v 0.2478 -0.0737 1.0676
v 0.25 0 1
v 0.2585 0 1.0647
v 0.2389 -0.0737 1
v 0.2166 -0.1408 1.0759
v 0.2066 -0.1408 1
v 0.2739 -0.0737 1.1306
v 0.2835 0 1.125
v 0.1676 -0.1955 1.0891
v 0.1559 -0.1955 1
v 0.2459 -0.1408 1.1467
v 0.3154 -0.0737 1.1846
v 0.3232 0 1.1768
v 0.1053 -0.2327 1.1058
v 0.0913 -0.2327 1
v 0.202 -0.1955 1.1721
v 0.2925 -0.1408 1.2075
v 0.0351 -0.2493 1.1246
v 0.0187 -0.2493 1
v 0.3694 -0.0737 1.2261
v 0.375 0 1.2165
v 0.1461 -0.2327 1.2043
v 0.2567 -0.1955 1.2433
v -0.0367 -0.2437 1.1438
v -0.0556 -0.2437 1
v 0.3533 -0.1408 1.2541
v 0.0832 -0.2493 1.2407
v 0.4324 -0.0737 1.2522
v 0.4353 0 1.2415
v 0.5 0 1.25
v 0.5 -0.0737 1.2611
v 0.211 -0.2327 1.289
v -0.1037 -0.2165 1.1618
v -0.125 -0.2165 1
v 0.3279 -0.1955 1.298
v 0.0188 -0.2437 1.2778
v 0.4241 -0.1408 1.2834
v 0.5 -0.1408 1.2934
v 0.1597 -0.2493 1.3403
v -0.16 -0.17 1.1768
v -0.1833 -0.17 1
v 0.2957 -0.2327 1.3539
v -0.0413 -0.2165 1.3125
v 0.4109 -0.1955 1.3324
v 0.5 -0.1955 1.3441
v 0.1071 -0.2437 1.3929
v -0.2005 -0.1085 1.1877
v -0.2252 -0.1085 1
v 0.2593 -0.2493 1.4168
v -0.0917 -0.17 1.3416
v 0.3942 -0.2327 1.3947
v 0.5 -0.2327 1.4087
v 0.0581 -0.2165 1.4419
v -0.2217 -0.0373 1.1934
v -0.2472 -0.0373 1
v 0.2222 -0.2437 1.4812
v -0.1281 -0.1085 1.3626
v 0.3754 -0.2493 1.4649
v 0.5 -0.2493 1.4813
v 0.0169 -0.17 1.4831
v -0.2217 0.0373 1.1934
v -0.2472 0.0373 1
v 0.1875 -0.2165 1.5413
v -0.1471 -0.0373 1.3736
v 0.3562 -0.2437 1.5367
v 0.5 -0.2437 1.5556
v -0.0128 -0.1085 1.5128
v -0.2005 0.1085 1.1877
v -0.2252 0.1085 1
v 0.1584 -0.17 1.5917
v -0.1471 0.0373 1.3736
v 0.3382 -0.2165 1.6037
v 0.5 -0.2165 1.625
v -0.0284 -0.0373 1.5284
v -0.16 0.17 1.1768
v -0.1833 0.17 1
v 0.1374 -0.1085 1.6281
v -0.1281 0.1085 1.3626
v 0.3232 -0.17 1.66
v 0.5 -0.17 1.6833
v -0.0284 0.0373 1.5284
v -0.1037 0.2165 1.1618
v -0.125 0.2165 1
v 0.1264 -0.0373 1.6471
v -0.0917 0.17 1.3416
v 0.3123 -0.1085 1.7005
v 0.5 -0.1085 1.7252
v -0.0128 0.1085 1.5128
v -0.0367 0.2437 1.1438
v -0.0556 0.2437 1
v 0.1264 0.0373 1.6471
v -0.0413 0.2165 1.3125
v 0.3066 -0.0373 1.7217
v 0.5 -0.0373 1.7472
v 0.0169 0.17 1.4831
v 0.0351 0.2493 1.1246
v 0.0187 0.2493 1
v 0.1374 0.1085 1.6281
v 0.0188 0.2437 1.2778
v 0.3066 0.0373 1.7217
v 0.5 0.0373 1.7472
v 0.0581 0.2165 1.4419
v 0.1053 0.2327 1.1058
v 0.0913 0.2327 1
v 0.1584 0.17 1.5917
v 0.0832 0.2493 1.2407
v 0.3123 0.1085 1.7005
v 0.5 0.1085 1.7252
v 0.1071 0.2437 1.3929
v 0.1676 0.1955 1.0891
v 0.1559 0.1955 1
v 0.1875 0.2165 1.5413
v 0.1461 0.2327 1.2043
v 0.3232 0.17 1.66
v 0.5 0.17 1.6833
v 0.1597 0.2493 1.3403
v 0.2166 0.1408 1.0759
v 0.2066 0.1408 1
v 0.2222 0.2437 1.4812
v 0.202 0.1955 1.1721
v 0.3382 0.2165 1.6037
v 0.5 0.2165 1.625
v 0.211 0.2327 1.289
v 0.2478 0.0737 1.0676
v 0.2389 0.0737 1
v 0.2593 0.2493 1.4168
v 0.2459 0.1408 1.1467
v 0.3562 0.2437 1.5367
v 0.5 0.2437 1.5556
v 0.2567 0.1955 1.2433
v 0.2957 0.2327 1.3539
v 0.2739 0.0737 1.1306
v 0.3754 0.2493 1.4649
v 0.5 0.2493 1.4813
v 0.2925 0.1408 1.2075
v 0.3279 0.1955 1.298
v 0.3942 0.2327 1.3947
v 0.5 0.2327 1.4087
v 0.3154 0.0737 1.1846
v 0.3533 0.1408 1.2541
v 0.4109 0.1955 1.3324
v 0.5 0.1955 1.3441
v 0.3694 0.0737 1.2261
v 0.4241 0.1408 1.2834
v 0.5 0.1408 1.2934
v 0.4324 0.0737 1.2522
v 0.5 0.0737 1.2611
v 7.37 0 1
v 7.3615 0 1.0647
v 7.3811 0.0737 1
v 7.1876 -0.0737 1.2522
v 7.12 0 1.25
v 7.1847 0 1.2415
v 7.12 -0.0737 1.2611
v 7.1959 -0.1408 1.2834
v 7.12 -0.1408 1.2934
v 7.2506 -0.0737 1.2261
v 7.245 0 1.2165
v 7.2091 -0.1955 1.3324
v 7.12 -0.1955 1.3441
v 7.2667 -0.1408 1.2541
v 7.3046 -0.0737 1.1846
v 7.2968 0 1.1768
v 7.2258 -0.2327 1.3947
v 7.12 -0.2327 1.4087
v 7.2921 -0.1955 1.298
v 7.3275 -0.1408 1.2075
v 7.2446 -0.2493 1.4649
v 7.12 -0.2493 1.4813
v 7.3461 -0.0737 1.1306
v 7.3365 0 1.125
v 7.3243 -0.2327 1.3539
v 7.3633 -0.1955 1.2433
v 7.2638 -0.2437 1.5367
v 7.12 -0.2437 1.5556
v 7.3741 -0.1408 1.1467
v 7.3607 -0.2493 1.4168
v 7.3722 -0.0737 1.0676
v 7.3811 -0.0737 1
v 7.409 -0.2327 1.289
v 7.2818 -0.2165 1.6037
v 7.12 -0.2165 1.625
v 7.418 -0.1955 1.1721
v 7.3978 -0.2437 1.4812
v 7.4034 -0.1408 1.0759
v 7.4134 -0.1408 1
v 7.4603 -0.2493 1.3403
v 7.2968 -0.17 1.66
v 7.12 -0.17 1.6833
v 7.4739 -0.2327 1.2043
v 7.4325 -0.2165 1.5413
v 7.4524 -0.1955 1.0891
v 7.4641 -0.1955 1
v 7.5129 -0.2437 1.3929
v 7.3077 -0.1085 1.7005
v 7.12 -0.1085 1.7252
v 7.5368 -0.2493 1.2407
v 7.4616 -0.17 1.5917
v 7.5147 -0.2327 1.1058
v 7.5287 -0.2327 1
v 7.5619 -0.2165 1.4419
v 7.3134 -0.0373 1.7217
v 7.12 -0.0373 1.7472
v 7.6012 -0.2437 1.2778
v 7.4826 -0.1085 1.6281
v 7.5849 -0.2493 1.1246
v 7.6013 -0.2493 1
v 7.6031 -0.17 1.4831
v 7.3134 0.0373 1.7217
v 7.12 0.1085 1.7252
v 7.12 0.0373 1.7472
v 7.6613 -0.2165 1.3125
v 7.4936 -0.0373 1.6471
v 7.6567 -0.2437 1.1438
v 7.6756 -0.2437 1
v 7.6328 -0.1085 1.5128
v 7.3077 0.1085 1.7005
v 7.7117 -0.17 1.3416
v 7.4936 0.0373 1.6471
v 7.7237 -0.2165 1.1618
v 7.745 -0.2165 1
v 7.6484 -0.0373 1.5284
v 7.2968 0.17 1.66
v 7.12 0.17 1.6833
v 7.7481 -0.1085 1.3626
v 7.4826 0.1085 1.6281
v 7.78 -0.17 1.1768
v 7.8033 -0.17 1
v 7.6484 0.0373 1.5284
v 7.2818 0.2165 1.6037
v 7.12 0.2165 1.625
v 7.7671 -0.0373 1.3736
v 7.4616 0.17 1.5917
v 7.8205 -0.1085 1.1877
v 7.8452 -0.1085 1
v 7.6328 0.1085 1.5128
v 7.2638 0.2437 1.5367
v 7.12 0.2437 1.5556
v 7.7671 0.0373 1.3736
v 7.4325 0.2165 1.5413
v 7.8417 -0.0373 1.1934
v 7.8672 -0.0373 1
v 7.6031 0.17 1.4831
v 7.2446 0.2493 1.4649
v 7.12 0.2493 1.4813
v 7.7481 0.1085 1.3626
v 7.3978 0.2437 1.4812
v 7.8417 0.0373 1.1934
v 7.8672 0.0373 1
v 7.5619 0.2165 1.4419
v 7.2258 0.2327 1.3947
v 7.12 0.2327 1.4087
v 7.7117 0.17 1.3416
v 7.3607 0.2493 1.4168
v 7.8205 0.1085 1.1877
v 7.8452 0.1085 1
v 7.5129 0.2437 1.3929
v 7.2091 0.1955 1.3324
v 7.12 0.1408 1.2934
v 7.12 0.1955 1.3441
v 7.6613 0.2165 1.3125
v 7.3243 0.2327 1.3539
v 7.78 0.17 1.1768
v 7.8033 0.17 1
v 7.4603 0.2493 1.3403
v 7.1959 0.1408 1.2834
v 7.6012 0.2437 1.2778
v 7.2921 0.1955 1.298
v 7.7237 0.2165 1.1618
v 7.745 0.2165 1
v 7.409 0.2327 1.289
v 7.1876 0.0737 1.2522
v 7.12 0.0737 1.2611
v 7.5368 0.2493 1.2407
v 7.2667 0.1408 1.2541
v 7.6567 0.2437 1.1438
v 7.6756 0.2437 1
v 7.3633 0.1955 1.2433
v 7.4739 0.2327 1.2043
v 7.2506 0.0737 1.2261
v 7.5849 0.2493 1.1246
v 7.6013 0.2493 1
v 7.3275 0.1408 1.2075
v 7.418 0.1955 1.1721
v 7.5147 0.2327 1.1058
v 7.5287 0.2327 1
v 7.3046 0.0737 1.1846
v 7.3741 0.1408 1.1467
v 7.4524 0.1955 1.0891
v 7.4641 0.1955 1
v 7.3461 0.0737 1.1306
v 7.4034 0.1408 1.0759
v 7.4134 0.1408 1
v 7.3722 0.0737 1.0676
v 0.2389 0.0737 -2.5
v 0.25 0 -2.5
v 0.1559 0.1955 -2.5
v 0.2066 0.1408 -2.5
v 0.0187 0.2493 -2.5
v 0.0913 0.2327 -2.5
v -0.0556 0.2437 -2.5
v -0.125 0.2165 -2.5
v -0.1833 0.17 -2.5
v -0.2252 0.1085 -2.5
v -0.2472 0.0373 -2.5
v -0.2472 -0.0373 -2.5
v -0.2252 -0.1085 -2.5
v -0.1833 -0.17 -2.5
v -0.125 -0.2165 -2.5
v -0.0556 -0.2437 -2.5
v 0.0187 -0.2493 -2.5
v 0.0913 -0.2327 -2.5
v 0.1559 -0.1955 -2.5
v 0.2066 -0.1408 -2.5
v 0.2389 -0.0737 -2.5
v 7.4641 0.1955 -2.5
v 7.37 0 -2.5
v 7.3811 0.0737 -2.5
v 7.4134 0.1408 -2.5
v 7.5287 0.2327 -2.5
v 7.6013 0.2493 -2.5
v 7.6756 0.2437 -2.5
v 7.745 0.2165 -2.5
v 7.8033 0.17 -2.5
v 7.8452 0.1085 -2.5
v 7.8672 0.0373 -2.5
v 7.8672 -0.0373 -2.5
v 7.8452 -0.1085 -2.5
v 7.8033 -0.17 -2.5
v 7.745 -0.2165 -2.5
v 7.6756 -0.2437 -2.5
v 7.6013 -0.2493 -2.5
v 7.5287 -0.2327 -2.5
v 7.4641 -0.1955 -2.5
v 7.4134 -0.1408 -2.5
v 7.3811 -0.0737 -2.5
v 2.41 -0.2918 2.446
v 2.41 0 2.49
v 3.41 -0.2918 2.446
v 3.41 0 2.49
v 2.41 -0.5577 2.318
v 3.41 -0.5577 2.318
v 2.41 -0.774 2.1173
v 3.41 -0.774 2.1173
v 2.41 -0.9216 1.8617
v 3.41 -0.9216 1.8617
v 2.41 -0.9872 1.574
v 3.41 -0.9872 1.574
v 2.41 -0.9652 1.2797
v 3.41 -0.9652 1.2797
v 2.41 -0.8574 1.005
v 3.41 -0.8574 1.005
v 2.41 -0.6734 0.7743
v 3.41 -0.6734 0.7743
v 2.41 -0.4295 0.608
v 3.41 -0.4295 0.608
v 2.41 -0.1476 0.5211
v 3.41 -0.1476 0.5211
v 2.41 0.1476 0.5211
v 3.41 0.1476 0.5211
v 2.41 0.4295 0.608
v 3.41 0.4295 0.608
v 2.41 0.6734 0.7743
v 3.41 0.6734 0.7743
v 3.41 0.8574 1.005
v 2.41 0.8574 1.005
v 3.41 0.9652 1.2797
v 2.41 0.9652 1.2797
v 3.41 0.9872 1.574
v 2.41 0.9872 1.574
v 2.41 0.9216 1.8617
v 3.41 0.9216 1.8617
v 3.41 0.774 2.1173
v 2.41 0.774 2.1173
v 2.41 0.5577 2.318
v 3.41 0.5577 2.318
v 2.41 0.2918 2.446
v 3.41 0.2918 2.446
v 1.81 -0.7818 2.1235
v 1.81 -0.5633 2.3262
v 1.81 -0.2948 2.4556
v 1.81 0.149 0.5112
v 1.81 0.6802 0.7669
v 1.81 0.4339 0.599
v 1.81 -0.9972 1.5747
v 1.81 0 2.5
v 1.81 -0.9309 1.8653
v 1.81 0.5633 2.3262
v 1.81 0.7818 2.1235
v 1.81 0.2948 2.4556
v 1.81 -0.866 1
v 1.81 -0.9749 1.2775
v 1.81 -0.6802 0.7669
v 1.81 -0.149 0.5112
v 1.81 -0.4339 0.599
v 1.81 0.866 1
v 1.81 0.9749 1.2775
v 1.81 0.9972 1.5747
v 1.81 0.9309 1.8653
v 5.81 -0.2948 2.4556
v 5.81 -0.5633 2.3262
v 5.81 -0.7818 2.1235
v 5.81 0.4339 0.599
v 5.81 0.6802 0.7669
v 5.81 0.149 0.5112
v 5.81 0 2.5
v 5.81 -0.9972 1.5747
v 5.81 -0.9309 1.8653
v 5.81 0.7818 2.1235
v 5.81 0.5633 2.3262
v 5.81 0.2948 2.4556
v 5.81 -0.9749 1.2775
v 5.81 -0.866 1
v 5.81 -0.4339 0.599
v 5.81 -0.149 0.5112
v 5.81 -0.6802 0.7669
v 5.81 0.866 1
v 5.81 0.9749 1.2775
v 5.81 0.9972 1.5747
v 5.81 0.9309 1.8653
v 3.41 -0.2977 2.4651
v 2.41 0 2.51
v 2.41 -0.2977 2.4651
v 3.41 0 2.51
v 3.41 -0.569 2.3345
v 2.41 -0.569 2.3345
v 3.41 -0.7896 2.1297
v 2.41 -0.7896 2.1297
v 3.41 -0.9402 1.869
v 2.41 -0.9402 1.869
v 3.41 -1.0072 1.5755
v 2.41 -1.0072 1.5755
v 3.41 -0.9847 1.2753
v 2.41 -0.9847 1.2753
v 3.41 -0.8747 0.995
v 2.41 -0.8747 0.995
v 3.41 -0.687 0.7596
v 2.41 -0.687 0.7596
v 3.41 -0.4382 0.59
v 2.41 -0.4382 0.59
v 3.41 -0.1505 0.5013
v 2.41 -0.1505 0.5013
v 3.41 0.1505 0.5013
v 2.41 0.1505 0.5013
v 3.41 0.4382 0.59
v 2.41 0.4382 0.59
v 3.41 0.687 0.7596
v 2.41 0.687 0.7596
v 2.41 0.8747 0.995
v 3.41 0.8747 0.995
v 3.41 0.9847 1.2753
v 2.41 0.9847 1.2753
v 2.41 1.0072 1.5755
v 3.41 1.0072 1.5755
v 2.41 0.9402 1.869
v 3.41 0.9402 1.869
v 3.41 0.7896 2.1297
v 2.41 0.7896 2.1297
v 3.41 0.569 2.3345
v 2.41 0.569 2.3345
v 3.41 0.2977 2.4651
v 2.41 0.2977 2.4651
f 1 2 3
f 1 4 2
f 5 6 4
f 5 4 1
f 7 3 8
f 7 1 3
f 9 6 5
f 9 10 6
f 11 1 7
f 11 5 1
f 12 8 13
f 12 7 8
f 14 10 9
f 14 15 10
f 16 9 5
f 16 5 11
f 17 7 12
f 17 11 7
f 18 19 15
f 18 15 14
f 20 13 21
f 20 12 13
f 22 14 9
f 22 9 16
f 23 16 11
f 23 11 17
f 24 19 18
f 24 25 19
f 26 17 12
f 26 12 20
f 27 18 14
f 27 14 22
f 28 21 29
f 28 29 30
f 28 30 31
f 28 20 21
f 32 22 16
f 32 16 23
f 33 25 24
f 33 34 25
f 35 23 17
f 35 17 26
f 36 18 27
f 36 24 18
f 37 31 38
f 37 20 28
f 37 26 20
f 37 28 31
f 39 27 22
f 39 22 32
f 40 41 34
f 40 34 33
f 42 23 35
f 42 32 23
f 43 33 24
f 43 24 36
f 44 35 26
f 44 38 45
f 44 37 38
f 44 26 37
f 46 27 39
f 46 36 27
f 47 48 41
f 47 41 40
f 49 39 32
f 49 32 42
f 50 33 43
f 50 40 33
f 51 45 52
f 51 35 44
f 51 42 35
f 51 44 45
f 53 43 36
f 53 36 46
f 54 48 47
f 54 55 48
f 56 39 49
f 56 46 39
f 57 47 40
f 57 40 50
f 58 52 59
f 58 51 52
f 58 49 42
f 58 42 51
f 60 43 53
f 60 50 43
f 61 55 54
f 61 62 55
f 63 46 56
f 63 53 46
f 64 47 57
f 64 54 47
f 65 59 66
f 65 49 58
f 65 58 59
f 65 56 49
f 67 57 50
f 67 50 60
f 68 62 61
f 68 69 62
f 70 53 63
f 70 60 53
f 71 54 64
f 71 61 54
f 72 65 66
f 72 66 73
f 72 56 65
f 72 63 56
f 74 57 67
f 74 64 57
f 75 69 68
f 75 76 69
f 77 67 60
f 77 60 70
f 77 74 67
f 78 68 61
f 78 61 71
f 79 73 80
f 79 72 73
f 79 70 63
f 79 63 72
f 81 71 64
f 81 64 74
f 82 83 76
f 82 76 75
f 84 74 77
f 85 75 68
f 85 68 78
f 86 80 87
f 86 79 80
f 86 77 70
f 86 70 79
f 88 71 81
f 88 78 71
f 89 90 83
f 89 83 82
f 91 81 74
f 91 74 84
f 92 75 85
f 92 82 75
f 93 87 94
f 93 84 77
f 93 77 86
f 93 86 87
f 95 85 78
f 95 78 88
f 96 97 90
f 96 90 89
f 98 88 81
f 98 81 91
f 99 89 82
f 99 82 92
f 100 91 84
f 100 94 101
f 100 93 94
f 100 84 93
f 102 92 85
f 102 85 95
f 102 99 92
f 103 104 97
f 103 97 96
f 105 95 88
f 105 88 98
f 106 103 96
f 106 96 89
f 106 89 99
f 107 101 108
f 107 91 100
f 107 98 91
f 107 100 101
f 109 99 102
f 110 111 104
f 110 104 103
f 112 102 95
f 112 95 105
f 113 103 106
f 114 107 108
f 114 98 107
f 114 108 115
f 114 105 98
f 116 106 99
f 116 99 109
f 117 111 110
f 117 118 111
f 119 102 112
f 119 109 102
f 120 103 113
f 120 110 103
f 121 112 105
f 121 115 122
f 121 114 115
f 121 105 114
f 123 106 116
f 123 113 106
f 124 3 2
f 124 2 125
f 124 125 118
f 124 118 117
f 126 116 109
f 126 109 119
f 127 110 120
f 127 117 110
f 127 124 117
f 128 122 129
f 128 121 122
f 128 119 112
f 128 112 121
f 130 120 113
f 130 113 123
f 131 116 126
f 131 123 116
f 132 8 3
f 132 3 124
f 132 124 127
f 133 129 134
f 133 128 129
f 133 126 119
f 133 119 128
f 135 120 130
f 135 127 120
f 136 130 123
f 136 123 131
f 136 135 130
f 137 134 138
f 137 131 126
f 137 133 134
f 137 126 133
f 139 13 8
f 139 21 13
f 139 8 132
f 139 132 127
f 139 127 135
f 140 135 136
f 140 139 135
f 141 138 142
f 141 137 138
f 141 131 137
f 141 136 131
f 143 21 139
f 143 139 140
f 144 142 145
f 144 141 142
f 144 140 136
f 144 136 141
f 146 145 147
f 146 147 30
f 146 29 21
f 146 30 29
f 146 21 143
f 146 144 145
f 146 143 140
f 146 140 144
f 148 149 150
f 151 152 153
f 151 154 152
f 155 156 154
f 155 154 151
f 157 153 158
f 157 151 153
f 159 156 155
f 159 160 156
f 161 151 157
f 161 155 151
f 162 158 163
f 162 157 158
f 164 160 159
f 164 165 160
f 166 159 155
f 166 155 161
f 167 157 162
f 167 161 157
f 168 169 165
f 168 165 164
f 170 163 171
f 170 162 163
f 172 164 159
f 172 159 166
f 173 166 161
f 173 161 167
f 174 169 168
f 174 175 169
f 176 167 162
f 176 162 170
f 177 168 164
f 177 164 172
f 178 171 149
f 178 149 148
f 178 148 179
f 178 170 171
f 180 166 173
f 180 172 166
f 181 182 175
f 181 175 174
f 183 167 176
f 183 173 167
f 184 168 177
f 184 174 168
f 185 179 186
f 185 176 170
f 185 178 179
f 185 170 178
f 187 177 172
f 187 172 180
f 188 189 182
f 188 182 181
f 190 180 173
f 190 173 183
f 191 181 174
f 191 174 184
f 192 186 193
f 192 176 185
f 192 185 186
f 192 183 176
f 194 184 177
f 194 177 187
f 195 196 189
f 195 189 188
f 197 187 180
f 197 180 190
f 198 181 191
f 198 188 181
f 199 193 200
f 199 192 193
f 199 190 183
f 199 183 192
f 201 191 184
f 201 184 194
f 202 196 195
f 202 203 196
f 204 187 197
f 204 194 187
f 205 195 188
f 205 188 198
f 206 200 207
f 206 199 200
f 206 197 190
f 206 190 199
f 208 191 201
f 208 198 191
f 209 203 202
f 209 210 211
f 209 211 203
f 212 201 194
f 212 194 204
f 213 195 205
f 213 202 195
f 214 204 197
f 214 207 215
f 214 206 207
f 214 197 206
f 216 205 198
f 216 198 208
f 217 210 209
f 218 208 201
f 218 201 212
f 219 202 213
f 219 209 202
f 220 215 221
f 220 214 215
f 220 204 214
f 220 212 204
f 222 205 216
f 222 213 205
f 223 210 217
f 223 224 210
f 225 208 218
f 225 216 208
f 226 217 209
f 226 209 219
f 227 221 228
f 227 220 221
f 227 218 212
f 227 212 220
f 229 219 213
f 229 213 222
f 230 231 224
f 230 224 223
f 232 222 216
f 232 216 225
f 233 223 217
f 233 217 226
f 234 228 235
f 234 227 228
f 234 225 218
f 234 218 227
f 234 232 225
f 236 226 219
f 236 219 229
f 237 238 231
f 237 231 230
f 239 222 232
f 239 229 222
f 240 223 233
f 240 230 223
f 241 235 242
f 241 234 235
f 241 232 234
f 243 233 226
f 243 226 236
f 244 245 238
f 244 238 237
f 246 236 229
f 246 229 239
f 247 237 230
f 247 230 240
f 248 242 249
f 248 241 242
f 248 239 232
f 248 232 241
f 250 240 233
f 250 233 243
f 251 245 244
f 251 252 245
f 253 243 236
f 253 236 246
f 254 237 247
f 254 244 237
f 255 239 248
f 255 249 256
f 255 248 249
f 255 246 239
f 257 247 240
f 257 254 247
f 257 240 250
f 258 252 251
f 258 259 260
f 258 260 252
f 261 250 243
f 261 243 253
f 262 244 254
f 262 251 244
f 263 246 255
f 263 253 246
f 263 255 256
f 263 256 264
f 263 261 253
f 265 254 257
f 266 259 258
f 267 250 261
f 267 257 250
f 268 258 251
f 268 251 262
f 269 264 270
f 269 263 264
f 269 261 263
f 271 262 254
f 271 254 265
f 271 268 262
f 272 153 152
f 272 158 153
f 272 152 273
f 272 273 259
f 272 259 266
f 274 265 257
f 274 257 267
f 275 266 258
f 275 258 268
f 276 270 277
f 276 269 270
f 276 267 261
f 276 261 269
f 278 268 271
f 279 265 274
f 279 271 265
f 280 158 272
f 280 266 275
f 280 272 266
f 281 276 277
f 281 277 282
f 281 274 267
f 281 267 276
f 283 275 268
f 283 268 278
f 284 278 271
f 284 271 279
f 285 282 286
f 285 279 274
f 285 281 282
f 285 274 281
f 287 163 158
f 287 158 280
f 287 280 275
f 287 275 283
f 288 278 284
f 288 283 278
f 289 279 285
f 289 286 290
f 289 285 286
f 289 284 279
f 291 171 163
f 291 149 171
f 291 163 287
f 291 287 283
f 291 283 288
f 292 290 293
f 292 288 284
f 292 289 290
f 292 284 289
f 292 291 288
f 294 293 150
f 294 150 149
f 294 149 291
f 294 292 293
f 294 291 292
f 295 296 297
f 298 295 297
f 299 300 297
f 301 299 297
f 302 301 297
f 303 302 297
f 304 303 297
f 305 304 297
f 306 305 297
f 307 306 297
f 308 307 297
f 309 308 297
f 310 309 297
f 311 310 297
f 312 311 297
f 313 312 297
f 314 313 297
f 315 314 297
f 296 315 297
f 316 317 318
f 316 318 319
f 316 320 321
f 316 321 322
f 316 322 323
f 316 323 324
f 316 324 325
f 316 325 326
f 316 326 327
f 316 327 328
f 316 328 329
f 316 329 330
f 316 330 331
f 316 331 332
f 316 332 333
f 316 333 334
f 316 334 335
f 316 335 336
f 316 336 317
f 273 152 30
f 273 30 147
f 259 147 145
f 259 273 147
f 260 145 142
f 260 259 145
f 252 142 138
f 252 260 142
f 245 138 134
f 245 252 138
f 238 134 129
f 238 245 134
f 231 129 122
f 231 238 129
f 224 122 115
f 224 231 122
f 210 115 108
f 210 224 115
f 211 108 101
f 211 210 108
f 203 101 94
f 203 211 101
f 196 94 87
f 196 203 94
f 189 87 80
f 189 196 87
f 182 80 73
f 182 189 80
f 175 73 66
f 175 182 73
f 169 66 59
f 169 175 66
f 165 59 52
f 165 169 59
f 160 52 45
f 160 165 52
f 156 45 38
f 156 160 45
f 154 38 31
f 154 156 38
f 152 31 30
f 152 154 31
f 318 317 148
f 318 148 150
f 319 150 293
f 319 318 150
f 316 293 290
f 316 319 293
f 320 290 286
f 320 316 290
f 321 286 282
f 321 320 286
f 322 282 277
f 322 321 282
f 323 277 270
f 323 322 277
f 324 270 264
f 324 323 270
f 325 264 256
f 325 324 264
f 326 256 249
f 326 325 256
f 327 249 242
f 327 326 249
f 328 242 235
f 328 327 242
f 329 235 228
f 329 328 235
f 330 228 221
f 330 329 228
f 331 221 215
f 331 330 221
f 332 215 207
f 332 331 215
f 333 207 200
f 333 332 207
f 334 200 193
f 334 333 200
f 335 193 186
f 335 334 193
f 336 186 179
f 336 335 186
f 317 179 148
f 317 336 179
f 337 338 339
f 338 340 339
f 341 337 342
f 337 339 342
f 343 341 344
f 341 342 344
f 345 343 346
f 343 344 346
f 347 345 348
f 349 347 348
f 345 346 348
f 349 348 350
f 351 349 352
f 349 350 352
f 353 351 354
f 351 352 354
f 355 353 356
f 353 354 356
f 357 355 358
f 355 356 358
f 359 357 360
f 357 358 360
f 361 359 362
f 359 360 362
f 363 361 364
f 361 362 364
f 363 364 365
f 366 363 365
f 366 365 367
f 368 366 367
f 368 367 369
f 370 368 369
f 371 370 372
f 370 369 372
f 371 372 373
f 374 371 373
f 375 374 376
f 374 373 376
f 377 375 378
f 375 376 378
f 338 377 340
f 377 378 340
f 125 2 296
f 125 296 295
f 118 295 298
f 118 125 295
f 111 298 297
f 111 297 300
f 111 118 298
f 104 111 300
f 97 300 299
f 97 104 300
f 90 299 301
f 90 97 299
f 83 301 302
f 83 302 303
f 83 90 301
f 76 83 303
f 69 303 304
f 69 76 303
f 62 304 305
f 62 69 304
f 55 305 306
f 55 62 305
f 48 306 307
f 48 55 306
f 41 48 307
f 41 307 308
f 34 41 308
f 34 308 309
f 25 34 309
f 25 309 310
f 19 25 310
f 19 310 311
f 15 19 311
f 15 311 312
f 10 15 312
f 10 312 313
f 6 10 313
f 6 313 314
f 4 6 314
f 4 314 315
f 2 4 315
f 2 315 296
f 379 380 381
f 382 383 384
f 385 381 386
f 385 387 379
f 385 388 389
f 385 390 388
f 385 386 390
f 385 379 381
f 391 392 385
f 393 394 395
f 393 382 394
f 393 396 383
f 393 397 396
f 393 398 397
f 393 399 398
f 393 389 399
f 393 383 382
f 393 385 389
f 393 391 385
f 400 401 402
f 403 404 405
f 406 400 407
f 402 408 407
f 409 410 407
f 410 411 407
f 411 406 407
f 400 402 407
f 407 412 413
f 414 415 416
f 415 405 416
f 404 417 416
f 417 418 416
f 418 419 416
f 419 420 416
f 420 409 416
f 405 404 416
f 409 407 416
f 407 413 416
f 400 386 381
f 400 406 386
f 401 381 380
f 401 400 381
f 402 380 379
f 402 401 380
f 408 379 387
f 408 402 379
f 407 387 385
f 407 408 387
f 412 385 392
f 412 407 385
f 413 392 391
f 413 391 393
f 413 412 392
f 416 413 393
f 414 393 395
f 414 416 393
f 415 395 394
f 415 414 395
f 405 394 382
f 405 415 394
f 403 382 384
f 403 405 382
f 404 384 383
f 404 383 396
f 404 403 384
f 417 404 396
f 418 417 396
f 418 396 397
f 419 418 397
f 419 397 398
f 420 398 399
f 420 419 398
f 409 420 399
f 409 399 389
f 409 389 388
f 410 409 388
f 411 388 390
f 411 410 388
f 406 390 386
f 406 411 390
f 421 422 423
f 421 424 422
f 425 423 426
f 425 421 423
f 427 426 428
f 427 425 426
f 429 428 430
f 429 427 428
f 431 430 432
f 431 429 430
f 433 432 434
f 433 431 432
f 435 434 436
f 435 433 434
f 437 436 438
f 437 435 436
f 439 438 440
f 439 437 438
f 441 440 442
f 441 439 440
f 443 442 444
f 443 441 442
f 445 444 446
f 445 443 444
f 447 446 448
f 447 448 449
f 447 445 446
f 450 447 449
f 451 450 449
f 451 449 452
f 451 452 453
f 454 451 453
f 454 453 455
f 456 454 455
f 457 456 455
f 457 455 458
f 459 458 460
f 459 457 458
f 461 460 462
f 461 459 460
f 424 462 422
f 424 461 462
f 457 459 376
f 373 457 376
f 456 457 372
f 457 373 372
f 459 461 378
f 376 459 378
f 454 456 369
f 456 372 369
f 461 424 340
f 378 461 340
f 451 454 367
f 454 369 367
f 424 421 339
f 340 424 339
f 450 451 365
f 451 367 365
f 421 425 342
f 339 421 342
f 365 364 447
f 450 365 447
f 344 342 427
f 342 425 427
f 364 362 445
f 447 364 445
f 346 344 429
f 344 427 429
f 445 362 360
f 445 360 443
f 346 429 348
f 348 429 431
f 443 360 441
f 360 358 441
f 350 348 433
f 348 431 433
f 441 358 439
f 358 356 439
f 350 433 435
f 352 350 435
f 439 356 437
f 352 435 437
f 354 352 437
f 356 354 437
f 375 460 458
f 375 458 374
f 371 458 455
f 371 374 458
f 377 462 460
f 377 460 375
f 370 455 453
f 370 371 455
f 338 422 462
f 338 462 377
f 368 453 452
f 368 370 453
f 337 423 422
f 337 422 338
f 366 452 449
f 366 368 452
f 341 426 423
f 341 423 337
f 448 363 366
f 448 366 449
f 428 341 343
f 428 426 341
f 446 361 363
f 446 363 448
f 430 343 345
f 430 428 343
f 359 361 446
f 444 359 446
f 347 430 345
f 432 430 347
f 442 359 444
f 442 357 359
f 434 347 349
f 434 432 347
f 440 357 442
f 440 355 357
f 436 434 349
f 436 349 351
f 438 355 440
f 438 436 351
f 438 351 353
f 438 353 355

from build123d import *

# Parameters (mm, degrees)
SKETCH002_W = 4
SKETCH002_H = 1
SKETCH003_W = 1
SKETCH003_H = 0.02
SKETCH_R    = 0.25


with BuildPart() as revolution:
    # Sketch002 → Revolution (revolve)
    with BuildSketch(Plane.XZ):
        with Locations((3.81, 2)):
            Rectangle(SKETCH002_W, SKETCH002_H)
    revolve(axis=Axis((1.81, 0, 1.5), (1, 0, 0)))


with BuildPart() as revolution001:
    # Sketch003 → Revolution001 (revolve)
    with BuildSketch(Plane.XZ):
        with Locations((2.91, 2.5)):
            Rectangle(SKETCH003_W, SKETCH003_H)
    revolve(axis=Axis((0, 0, 1.5), (1, 0, 0)))


with BuildPart() as sweep_body:
    # Sweep: sweep along a path in Sketch001
    with BuildLine(Plane.XZ) as sweep_path:
        Line((0, -2.5), (0, 1))
        ThreePointArc((0, 1), (0.146447, 1.353553), (0.5, 1.5))
        Line((0.5, 1.5), (7.12, 1.5))
        ThreePointArc((7.12, 1.5), (7.473553, 1.353553), (7.62, 1))
        Line((7.62, 1), (7.62, -2.5))
    # Sketch → Sweep (sweep)
    with BuildSketch(Plane.XY.offset(-2)):
        Circle(SKETCH_R)
    sweep(path=sweep_path.line)


solid = Compound([revolution.part, revolution001.part, sweep_body.part])
